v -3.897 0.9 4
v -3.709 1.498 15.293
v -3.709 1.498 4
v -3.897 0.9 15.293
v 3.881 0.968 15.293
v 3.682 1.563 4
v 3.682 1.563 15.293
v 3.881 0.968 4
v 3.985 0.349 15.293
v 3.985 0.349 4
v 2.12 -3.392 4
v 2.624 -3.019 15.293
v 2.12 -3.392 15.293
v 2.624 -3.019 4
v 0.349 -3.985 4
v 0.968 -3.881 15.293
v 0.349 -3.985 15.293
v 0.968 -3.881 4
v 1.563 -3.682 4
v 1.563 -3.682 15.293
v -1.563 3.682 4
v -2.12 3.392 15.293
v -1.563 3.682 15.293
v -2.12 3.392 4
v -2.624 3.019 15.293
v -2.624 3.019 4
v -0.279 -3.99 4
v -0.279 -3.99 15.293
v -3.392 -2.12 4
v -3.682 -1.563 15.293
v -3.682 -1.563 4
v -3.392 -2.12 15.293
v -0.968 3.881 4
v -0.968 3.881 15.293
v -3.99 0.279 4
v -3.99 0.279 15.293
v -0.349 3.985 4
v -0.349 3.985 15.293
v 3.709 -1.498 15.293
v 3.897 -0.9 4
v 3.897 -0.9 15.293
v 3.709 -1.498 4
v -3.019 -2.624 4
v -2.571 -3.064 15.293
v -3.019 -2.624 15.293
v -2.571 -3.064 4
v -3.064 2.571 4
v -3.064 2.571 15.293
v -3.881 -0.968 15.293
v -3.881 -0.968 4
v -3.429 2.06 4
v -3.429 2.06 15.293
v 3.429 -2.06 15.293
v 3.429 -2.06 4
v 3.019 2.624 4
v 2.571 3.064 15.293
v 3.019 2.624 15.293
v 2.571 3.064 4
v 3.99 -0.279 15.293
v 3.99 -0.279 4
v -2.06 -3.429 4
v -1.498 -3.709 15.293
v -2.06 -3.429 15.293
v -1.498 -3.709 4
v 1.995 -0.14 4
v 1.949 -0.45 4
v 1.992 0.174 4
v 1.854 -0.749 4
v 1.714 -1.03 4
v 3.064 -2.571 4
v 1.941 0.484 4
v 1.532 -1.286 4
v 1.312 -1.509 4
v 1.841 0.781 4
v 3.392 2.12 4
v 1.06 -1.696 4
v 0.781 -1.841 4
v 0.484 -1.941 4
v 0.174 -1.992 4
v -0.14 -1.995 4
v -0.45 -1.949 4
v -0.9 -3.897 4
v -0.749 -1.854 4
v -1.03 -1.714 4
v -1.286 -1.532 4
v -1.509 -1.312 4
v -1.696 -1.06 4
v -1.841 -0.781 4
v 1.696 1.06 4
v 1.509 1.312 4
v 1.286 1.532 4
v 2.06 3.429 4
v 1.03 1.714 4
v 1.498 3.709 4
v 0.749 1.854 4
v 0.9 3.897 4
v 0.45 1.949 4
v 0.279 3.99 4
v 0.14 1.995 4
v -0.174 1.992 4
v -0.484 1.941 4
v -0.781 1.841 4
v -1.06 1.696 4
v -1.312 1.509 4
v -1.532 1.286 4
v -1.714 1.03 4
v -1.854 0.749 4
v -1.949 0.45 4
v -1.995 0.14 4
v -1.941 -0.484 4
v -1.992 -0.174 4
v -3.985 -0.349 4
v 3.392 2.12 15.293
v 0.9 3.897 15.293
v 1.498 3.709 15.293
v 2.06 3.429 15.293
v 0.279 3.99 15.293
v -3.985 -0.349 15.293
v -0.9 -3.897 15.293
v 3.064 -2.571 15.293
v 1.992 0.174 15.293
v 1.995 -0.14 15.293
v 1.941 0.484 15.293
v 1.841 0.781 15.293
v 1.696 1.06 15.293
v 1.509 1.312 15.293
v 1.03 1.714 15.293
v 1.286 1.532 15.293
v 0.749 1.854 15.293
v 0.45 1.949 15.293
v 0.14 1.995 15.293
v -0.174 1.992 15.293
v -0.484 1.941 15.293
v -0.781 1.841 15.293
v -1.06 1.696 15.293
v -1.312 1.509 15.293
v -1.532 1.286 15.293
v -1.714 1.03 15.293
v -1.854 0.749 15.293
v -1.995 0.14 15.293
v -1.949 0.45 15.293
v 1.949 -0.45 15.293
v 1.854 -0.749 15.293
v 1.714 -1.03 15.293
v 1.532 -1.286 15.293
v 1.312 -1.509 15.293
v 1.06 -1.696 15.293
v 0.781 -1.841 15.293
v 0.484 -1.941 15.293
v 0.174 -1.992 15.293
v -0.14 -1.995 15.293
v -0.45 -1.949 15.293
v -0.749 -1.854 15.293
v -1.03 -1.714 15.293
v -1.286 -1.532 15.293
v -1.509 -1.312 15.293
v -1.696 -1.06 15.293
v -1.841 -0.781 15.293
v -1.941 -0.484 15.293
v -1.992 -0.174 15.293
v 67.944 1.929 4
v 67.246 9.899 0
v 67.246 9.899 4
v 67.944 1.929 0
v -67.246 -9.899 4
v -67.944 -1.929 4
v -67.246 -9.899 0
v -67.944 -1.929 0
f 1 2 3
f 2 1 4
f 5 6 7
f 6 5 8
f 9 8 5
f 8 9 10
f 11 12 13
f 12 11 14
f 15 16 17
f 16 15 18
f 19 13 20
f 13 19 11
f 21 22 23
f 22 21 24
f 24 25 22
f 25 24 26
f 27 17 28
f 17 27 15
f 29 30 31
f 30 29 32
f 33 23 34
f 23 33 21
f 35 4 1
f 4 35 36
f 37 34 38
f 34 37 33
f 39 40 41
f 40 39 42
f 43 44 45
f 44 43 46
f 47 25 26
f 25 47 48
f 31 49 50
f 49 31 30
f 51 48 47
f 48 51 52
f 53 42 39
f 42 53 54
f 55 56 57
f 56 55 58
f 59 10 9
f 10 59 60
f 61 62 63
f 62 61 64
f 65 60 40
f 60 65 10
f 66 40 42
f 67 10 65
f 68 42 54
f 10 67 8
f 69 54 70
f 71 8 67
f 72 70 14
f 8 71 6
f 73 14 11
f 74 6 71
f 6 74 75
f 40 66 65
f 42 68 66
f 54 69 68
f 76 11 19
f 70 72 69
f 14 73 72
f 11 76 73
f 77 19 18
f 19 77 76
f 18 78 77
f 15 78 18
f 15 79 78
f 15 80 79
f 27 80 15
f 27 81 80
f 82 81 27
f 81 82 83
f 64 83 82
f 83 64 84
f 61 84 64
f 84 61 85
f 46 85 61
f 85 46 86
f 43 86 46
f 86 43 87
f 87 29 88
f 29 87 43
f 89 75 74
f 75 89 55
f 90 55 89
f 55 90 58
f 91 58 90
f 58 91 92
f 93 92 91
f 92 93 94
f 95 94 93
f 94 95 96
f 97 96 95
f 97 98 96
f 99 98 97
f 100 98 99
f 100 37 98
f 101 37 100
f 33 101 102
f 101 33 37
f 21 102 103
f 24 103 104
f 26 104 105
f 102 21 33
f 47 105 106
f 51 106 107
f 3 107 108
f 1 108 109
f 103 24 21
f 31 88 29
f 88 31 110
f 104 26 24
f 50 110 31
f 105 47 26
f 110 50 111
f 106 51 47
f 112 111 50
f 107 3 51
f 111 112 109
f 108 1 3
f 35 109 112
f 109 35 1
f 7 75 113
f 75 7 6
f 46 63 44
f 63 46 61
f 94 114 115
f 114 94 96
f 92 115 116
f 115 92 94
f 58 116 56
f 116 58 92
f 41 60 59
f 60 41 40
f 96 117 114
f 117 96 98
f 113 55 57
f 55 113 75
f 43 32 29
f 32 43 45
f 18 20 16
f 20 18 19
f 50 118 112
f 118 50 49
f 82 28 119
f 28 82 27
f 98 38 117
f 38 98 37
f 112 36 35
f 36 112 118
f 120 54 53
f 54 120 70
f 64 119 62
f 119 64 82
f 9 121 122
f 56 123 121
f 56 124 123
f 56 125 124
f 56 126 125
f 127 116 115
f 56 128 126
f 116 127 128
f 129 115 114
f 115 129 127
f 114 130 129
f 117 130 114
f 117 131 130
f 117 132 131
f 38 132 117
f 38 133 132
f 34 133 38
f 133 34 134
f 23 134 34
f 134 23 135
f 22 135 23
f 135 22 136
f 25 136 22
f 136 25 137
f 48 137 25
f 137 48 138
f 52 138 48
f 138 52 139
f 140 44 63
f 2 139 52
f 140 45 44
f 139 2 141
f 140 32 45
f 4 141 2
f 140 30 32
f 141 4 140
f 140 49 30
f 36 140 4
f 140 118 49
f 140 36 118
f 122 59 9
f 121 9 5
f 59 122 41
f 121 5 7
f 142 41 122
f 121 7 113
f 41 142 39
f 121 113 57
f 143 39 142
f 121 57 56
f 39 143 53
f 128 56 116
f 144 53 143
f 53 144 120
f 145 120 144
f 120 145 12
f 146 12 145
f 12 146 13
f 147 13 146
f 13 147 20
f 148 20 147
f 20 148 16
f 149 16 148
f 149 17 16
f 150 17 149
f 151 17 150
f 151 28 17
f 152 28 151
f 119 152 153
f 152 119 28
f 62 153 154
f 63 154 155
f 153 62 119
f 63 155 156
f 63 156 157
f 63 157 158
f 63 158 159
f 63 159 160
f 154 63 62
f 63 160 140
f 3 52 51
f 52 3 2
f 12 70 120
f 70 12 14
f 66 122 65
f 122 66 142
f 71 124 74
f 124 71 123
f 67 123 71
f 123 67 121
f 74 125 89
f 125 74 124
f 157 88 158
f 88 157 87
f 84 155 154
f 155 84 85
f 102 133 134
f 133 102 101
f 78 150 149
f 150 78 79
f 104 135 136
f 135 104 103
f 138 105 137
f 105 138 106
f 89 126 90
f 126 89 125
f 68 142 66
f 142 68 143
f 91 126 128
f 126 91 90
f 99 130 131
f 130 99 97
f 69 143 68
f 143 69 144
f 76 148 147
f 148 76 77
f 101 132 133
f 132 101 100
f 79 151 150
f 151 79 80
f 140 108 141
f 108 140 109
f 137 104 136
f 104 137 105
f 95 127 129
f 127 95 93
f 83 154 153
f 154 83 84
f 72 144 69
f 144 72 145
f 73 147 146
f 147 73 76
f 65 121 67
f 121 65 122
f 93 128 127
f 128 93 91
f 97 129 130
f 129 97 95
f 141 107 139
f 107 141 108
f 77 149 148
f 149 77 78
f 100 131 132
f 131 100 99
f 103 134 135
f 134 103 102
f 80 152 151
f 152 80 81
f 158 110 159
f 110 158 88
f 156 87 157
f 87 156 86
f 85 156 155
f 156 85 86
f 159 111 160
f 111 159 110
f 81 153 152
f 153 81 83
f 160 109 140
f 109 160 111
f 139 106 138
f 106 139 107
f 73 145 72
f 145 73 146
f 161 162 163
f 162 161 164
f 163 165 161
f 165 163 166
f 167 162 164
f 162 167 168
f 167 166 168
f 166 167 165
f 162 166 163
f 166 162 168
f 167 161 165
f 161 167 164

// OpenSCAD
$fn = 40;

e=2; // epaisseur paroi
e_feutre = 0.5 ; // epaisseur feutre 

a_bec=30; // angle arc de cercle pour la sortie vers le bec

d_raccord_sifflet = 15 ; // diametre du sifflet interne
d_raccord_externe_sifflet = 18 ; // diamètre du sifflet externe
l_racord_male_sifflet=15;// longueur du tube male enquillant le sifflet
l_raccord_sifflet = 15 ; // longueur du transformateur de forme sifflet / tube

d_tube= sqrt(3.14159*d_raccord_sifflet*d_raccord_sifflet/4); //largeur tube interne
d_tore=150; // diametre du tore
d_axe=4;
h_axe=3;
l_bec = 25; // longueur total bec
l_embouchure = 20; // longueur bec
h_embouchure = 0.5 ; // hauteur embouchure intérieure
l_raccord_embouchure = 15 ; // racord embouchure
a_sifflet = atan(e/(l_bec/2)) ; // angle siffelt fenetre
l_bouchon= 2.5+3*e;
d_vis = 3 ; // diametre vis axe


module axe()
{
	translate([0,0,e])
    union()
    {
            rotate([0,0,5])
                union()
                { 
					// bras de portage de l'axe
                    cube([d_tore-d_tube-e/2,d_axe+ 2*e,2*e],center=true);
                    translate([0,0,((d_tube-e)/2)+e])
                    difference()
                    {
                        cylinder(d=d_axe+ 2*e,h=d_tube-e,center=true);
                        cylinder(d=d_axe,h=50,center=true);
                    }
                }
        
    }
}
module tore(a)
{
	rotate_extrude(angle = a, convexity = 10)
	{
		translate([d_tore/2,0,0])
		difference()
		{
			square(size=d_tube+2*e,center=true);
			square(size=d_tube,center=true);
		}
	}
}
module tube_notes()
{
	difference()
    {
        tore(180);
		translate([0,0,d_tube/2+e/2])
			bouchon(0,0);
    }
    translate([0,0,-d_tube/2-e])
		axe();
}
module raccord_bec()
{
	// raccord entre tube_bec et un sifflet standard
	difference()
	{
		hull()
		{
			rotate([0,90,0])
				cylinder(d=d_raccord_sifflet+2*e,h=1,center=true);
			translate([l_raccord_sifflet,0,0])
				cube([1,d_tube+2*e,d_tube+2*e],center=true);
		}
		hull()
		{
			rotate([0,90,0])
				cylinder(d=d_raccord_sifflet,h=1,center=true);
			translate([l_raccord_sifflet,0,0])
				cube([1,d_tube,d_tube],center=true);
		}
	}
	translate([-l_racord_male_sifflet/2-0.5,0,0])
		rotate([0,90,0])
			difference()
			{
				cylinder(d=d_raccord_externe_sifflet,h=l_racord_male_sifflet,center=true);
				cylinder(d=d_raccord_sifflet,h=l_racord_male_sifflet,center=true);
			}
}
module tube_bec()
{
	// sortie du tore
	difference()
    {
        translate([-d_tore,0,0])
            rotate([0,0,-a_bec])
				tore(a_bec);
		translate([0,0,d_tube/2+e/2])
			bouchon(0,0);
    }
	
}
module trou()
{
    difference()
    {
        cylinder(d=d_tore+d_tube/2 + 4*e,h=2*e,center=true);
        translate([d_tore+d_tube/2,0,0])
            cube([2*(d_tore+d_tube/2),2*(d_tore+d_tube/2),2*e],center=true);
        rotate([0,0,160])
            translate([d_tore+d_tube/2,0,0])
                cube([2*(d_tore+d_tube/2),2*(d_tore+d_tube/2),2*e],center = true);
       cylinder(d=d_tore-d_tube,h=2*e,center=true);
    }
}
module bord_bouchon(dd)
{
	rotate_extrude(angle = 360, convexity = 10)
		polygon(points = [ [d_tore/2+d_tube/2-(dd*e_feutre), -(1-dd)*e_feutre/2], [d_tore/2+d_tube/2-e/2-(dd*e_feutre), -(1-dd)*e_feutre/2],[d_tore/2+d_tube/2-e/2-(dd*e_feutre), e] ]);
}
module bouchon(a,dd)
{
    rotate([0,0,a])
	difference()
	{
		union()
		{
			difference()
			{
					union()
					{
						// plateau
						cylinder(d=d_tore+d_tube -e-2*(dd*e_feutre)+0.1,h=e+(1-dd)*e_feutre,center=true);
						// bord bisauté
						translate([0,0,-e/2])
							bord_bouchon(dd);
						// axe
						translate([0,0,-h_axe/2-e/2])
							cylinder(d=d_axe-0.1,h=h_axe,center=true);
					}
					// trou pour regler la heuteur de son
					rotate([0,0,32])
						trou();
					// evidements varies
					for(i=[0:8])
						rotate([0,0,i*360/8])
							translate([20,0,0])
								cylinder(d=12,h=e,center=true);
					for(i=[0:8])
						rotate([0,0,(i+0.5)*360/8])
							translate([40,0,0])
								cylinder(d=27,h=e,center=true);
					for(i=[0:8])
						rotate([0,0,i*360/8])
							translate([55,0,0])
								cylinder(d=15,h=e,center=true);
			}
		}
		// trou vis
		cylinder(d=d_vis,h=20,center=true);
	}
}
module sifflet()
{
    difference()
    {
        cube([l_bec,d_tube+2*e,d_tube+2*e],center=true);
        cube([l_bec,d_tube,d_tube],center=true);
        // sifflet
        translate([0,-(d_tube)/2,(d_tube)/2])
            rotate([0,-a_sifflet,0])
                cube([2*d_tube,d_tube,2*d_tube],center=false);
        translate([-l_bec/2,-d_tube/2,(d_tube-e)/2-e/2])
            cube([l_bec/2,d_tube,2*d_tube],center=false);
    }
}
module embouchure()
{
	// conduit air
	translate([0,0,d_tube/2])
		difference()
		{
			cube([l_embouchure,d_tube,h_embouchure+e],center=true);
			cube([l_embouchure,d_tube-e,h_embouchure],center=true);
		}
	// bouchon
	translate([l_embouchure/2-l_bouchon/2,0,-(h_embouchure+e)/4])
		difference()
		{
			cube([l_bouchon,d_tube,d_tube-(h_embouchure+e)/2],center=true);
			cylinder(d=2.5,h=d_tube-(h_embouchure+e)/2,center=true);
		}
}
module bec()
{
	sifflet();
    translate([-13,0,0])
		embouchure();
}
module instrument()
{
	tube_notes();
	tube_bec();
	
	translate([-d_tore,0,0])
		rotate([0,0,-a_bec])
			translate([d_tore/2,-l_bec/2,0])
				rotate([0,0,90])
					raccord_bec() ;
	*translate([-d_tore,0,0])
		rotate([0,0,-a_bec])
			translate([d_tore/2,-l_bec/2,0])
				rotate([0,0,90])
					bec() ;
    translate([0,0,d_tube/2+e/2]) 
		bouchon(130,1);
}


*instrument();
*bouchon(0,1);
axe();
*bec();
*difference()
{
	bec();
	translate([0,-40,0])
		cube([80,80,80],center=true);
}
*bord_bouchon();
*raccord_bec() ;

// a imprimer
*rotate([0,90,0])
	sifflet();
*translate([0,25,0])
	rotate([0,90,0])
		embouchure() ;
*tube_bec();
*tube_notes();
*bouchon(130,1);
